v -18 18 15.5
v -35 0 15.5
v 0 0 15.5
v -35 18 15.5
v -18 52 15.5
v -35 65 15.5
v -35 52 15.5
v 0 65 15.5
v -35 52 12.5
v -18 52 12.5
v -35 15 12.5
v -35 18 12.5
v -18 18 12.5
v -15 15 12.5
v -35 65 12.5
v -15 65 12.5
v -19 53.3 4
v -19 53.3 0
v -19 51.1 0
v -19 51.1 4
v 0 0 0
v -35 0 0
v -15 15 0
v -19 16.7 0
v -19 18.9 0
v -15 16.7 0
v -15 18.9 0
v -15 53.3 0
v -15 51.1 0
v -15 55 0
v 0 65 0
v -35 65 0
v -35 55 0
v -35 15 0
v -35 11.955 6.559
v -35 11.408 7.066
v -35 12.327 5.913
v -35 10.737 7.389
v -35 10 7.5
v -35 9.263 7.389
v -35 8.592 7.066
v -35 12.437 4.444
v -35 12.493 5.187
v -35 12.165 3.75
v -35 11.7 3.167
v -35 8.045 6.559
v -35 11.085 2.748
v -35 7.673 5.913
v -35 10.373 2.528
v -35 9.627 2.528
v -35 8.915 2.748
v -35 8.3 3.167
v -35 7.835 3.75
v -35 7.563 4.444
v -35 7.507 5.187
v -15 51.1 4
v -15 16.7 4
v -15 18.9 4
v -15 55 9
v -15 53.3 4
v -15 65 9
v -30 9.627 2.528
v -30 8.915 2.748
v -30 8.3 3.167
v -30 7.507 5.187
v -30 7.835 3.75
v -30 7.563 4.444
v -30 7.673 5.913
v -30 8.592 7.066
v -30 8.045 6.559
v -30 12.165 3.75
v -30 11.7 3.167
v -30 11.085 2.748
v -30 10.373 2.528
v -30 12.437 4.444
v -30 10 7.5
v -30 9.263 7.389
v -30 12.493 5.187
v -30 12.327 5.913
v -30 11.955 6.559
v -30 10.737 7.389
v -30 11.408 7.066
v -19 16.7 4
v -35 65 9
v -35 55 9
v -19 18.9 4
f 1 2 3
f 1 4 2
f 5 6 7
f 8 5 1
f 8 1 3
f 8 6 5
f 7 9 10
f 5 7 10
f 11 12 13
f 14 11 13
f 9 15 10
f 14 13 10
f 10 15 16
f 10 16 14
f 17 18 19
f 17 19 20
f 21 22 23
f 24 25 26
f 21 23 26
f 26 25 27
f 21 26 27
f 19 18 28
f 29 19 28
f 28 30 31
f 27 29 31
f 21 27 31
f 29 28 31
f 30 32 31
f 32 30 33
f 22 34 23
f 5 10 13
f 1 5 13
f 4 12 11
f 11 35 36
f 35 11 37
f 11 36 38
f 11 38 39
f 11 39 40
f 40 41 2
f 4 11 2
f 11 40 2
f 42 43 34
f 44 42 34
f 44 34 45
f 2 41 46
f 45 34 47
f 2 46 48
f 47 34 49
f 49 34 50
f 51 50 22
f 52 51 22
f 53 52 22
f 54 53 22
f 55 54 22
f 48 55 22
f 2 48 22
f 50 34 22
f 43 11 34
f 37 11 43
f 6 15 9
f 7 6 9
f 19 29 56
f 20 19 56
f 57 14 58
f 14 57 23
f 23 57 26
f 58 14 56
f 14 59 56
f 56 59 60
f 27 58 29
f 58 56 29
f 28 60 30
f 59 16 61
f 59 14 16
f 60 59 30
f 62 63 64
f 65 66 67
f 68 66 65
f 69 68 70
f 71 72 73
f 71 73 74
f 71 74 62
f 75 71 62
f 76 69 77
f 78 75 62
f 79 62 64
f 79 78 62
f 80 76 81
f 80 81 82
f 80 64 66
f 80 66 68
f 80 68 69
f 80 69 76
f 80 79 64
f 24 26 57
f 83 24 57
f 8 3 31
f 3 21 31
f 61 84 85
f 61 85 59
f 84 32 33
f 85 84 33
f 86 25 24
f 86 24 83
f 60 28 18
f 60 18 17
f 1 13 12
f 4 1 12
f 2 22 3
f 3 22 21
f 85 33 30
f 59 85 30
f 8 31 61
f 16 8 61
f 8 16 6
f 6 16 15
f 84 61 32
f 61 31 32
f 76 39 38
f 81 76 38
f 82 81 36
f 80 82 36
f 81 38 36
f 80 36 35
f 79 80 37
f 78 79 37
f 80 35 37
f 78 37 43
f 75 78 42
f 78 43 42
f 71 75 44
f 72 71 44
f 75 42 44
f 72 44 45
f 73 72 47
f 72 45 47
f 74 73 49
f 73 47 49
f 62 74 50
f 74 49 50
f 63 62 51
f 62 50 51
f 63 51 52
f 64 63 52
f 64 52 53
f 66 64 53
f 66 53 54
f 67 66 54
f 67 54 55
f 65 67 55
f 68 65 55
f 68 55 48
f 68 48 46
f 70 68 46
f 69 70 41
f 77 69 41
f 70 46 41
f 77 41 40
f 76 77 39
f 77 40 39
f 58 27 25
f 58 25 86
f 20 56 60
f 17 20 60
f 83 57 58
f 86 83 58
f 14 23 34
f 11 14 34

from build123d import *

# Parameters (mm, degrees)
BOSS_EXTRUDE1_DEPTH = 12.5
SKETCH2_W           = 20
SKETCH2_H           = 3.5
CUT_EXTRUDE1_DEPTH  = 10
BOSS_EXTRUDE2_DEPTH = 3
SKETCH4_R           = 2.5
CUT_EXTRUDE2_DEPTH  = 5
SKETCH5_W           = 4
SKETCH5_H           = 2.2
BOSS_EXTRUDE3_DEPTH = 4


with BuildPart() as part:
    # Sketch1 → Boss-Extrude1 (new body)
    with BuildSketch(Plane.XY):
        Polygon((0, 0), (0, 65), (-35, 65), (-35, 55), (-15, 55), (-15, 15), (-35, 15), (-35, 0), align=None)
    extrude(amount=BOSS_EXTRUDE1_DEPTH)

    # Sketch2 → Cut-Extrude1 (cut)
    with BuildSketch(Plane(origin=(0, 65, 0), x_dir=(1, 0, 0), z_dir=(0, 1, 0))):
        with Locations((-25, -10.75)):
            Rectangle(SKETCH2_W, SKETCH2_H)
    extrude(amount=-CUT_EXTRUDE1_DEPTH, mode=Mode.SUBTRACT)

    # Sketch3 → Boss-Extrude2 (add)
    with BuildSketch(Plane.XY.offset(12.5)):
        Polygon((-35, 0), (0, 0), (0, 65), (-35, 65), (-35, 52), (-18, 52), (-18, 18), (-35, 18), align=None)
    extrude(amount=BOSS_EXTRUDE2_DEPTH)

    # Sketch4 → Cut-Extrude2 (cut)
    with BuildSketch(Plane.ZY.offset(35)):
        with Locations((5, 10)):
            Circle(SKETCH4_R)
    extrude(amount=-CUT_EXTRUDE2_DEPTH, mode=Mode.SUBTRACT)

    # Sketch5 → Boss-Extrude3 (add)
    with BuildSketch(Plane.ZY.offset(15)):
        with Locations((2, 17.8)):
            Rectangle(SKETCH5_W, SKETCH5_H)
        with Locations((2, 52.2)):
            Rectangle(SKETCH5_W, SKETCH5_H)
    extrude(amount=BOSS_EXTRUDE3_DEPTH)


solid = part.part
